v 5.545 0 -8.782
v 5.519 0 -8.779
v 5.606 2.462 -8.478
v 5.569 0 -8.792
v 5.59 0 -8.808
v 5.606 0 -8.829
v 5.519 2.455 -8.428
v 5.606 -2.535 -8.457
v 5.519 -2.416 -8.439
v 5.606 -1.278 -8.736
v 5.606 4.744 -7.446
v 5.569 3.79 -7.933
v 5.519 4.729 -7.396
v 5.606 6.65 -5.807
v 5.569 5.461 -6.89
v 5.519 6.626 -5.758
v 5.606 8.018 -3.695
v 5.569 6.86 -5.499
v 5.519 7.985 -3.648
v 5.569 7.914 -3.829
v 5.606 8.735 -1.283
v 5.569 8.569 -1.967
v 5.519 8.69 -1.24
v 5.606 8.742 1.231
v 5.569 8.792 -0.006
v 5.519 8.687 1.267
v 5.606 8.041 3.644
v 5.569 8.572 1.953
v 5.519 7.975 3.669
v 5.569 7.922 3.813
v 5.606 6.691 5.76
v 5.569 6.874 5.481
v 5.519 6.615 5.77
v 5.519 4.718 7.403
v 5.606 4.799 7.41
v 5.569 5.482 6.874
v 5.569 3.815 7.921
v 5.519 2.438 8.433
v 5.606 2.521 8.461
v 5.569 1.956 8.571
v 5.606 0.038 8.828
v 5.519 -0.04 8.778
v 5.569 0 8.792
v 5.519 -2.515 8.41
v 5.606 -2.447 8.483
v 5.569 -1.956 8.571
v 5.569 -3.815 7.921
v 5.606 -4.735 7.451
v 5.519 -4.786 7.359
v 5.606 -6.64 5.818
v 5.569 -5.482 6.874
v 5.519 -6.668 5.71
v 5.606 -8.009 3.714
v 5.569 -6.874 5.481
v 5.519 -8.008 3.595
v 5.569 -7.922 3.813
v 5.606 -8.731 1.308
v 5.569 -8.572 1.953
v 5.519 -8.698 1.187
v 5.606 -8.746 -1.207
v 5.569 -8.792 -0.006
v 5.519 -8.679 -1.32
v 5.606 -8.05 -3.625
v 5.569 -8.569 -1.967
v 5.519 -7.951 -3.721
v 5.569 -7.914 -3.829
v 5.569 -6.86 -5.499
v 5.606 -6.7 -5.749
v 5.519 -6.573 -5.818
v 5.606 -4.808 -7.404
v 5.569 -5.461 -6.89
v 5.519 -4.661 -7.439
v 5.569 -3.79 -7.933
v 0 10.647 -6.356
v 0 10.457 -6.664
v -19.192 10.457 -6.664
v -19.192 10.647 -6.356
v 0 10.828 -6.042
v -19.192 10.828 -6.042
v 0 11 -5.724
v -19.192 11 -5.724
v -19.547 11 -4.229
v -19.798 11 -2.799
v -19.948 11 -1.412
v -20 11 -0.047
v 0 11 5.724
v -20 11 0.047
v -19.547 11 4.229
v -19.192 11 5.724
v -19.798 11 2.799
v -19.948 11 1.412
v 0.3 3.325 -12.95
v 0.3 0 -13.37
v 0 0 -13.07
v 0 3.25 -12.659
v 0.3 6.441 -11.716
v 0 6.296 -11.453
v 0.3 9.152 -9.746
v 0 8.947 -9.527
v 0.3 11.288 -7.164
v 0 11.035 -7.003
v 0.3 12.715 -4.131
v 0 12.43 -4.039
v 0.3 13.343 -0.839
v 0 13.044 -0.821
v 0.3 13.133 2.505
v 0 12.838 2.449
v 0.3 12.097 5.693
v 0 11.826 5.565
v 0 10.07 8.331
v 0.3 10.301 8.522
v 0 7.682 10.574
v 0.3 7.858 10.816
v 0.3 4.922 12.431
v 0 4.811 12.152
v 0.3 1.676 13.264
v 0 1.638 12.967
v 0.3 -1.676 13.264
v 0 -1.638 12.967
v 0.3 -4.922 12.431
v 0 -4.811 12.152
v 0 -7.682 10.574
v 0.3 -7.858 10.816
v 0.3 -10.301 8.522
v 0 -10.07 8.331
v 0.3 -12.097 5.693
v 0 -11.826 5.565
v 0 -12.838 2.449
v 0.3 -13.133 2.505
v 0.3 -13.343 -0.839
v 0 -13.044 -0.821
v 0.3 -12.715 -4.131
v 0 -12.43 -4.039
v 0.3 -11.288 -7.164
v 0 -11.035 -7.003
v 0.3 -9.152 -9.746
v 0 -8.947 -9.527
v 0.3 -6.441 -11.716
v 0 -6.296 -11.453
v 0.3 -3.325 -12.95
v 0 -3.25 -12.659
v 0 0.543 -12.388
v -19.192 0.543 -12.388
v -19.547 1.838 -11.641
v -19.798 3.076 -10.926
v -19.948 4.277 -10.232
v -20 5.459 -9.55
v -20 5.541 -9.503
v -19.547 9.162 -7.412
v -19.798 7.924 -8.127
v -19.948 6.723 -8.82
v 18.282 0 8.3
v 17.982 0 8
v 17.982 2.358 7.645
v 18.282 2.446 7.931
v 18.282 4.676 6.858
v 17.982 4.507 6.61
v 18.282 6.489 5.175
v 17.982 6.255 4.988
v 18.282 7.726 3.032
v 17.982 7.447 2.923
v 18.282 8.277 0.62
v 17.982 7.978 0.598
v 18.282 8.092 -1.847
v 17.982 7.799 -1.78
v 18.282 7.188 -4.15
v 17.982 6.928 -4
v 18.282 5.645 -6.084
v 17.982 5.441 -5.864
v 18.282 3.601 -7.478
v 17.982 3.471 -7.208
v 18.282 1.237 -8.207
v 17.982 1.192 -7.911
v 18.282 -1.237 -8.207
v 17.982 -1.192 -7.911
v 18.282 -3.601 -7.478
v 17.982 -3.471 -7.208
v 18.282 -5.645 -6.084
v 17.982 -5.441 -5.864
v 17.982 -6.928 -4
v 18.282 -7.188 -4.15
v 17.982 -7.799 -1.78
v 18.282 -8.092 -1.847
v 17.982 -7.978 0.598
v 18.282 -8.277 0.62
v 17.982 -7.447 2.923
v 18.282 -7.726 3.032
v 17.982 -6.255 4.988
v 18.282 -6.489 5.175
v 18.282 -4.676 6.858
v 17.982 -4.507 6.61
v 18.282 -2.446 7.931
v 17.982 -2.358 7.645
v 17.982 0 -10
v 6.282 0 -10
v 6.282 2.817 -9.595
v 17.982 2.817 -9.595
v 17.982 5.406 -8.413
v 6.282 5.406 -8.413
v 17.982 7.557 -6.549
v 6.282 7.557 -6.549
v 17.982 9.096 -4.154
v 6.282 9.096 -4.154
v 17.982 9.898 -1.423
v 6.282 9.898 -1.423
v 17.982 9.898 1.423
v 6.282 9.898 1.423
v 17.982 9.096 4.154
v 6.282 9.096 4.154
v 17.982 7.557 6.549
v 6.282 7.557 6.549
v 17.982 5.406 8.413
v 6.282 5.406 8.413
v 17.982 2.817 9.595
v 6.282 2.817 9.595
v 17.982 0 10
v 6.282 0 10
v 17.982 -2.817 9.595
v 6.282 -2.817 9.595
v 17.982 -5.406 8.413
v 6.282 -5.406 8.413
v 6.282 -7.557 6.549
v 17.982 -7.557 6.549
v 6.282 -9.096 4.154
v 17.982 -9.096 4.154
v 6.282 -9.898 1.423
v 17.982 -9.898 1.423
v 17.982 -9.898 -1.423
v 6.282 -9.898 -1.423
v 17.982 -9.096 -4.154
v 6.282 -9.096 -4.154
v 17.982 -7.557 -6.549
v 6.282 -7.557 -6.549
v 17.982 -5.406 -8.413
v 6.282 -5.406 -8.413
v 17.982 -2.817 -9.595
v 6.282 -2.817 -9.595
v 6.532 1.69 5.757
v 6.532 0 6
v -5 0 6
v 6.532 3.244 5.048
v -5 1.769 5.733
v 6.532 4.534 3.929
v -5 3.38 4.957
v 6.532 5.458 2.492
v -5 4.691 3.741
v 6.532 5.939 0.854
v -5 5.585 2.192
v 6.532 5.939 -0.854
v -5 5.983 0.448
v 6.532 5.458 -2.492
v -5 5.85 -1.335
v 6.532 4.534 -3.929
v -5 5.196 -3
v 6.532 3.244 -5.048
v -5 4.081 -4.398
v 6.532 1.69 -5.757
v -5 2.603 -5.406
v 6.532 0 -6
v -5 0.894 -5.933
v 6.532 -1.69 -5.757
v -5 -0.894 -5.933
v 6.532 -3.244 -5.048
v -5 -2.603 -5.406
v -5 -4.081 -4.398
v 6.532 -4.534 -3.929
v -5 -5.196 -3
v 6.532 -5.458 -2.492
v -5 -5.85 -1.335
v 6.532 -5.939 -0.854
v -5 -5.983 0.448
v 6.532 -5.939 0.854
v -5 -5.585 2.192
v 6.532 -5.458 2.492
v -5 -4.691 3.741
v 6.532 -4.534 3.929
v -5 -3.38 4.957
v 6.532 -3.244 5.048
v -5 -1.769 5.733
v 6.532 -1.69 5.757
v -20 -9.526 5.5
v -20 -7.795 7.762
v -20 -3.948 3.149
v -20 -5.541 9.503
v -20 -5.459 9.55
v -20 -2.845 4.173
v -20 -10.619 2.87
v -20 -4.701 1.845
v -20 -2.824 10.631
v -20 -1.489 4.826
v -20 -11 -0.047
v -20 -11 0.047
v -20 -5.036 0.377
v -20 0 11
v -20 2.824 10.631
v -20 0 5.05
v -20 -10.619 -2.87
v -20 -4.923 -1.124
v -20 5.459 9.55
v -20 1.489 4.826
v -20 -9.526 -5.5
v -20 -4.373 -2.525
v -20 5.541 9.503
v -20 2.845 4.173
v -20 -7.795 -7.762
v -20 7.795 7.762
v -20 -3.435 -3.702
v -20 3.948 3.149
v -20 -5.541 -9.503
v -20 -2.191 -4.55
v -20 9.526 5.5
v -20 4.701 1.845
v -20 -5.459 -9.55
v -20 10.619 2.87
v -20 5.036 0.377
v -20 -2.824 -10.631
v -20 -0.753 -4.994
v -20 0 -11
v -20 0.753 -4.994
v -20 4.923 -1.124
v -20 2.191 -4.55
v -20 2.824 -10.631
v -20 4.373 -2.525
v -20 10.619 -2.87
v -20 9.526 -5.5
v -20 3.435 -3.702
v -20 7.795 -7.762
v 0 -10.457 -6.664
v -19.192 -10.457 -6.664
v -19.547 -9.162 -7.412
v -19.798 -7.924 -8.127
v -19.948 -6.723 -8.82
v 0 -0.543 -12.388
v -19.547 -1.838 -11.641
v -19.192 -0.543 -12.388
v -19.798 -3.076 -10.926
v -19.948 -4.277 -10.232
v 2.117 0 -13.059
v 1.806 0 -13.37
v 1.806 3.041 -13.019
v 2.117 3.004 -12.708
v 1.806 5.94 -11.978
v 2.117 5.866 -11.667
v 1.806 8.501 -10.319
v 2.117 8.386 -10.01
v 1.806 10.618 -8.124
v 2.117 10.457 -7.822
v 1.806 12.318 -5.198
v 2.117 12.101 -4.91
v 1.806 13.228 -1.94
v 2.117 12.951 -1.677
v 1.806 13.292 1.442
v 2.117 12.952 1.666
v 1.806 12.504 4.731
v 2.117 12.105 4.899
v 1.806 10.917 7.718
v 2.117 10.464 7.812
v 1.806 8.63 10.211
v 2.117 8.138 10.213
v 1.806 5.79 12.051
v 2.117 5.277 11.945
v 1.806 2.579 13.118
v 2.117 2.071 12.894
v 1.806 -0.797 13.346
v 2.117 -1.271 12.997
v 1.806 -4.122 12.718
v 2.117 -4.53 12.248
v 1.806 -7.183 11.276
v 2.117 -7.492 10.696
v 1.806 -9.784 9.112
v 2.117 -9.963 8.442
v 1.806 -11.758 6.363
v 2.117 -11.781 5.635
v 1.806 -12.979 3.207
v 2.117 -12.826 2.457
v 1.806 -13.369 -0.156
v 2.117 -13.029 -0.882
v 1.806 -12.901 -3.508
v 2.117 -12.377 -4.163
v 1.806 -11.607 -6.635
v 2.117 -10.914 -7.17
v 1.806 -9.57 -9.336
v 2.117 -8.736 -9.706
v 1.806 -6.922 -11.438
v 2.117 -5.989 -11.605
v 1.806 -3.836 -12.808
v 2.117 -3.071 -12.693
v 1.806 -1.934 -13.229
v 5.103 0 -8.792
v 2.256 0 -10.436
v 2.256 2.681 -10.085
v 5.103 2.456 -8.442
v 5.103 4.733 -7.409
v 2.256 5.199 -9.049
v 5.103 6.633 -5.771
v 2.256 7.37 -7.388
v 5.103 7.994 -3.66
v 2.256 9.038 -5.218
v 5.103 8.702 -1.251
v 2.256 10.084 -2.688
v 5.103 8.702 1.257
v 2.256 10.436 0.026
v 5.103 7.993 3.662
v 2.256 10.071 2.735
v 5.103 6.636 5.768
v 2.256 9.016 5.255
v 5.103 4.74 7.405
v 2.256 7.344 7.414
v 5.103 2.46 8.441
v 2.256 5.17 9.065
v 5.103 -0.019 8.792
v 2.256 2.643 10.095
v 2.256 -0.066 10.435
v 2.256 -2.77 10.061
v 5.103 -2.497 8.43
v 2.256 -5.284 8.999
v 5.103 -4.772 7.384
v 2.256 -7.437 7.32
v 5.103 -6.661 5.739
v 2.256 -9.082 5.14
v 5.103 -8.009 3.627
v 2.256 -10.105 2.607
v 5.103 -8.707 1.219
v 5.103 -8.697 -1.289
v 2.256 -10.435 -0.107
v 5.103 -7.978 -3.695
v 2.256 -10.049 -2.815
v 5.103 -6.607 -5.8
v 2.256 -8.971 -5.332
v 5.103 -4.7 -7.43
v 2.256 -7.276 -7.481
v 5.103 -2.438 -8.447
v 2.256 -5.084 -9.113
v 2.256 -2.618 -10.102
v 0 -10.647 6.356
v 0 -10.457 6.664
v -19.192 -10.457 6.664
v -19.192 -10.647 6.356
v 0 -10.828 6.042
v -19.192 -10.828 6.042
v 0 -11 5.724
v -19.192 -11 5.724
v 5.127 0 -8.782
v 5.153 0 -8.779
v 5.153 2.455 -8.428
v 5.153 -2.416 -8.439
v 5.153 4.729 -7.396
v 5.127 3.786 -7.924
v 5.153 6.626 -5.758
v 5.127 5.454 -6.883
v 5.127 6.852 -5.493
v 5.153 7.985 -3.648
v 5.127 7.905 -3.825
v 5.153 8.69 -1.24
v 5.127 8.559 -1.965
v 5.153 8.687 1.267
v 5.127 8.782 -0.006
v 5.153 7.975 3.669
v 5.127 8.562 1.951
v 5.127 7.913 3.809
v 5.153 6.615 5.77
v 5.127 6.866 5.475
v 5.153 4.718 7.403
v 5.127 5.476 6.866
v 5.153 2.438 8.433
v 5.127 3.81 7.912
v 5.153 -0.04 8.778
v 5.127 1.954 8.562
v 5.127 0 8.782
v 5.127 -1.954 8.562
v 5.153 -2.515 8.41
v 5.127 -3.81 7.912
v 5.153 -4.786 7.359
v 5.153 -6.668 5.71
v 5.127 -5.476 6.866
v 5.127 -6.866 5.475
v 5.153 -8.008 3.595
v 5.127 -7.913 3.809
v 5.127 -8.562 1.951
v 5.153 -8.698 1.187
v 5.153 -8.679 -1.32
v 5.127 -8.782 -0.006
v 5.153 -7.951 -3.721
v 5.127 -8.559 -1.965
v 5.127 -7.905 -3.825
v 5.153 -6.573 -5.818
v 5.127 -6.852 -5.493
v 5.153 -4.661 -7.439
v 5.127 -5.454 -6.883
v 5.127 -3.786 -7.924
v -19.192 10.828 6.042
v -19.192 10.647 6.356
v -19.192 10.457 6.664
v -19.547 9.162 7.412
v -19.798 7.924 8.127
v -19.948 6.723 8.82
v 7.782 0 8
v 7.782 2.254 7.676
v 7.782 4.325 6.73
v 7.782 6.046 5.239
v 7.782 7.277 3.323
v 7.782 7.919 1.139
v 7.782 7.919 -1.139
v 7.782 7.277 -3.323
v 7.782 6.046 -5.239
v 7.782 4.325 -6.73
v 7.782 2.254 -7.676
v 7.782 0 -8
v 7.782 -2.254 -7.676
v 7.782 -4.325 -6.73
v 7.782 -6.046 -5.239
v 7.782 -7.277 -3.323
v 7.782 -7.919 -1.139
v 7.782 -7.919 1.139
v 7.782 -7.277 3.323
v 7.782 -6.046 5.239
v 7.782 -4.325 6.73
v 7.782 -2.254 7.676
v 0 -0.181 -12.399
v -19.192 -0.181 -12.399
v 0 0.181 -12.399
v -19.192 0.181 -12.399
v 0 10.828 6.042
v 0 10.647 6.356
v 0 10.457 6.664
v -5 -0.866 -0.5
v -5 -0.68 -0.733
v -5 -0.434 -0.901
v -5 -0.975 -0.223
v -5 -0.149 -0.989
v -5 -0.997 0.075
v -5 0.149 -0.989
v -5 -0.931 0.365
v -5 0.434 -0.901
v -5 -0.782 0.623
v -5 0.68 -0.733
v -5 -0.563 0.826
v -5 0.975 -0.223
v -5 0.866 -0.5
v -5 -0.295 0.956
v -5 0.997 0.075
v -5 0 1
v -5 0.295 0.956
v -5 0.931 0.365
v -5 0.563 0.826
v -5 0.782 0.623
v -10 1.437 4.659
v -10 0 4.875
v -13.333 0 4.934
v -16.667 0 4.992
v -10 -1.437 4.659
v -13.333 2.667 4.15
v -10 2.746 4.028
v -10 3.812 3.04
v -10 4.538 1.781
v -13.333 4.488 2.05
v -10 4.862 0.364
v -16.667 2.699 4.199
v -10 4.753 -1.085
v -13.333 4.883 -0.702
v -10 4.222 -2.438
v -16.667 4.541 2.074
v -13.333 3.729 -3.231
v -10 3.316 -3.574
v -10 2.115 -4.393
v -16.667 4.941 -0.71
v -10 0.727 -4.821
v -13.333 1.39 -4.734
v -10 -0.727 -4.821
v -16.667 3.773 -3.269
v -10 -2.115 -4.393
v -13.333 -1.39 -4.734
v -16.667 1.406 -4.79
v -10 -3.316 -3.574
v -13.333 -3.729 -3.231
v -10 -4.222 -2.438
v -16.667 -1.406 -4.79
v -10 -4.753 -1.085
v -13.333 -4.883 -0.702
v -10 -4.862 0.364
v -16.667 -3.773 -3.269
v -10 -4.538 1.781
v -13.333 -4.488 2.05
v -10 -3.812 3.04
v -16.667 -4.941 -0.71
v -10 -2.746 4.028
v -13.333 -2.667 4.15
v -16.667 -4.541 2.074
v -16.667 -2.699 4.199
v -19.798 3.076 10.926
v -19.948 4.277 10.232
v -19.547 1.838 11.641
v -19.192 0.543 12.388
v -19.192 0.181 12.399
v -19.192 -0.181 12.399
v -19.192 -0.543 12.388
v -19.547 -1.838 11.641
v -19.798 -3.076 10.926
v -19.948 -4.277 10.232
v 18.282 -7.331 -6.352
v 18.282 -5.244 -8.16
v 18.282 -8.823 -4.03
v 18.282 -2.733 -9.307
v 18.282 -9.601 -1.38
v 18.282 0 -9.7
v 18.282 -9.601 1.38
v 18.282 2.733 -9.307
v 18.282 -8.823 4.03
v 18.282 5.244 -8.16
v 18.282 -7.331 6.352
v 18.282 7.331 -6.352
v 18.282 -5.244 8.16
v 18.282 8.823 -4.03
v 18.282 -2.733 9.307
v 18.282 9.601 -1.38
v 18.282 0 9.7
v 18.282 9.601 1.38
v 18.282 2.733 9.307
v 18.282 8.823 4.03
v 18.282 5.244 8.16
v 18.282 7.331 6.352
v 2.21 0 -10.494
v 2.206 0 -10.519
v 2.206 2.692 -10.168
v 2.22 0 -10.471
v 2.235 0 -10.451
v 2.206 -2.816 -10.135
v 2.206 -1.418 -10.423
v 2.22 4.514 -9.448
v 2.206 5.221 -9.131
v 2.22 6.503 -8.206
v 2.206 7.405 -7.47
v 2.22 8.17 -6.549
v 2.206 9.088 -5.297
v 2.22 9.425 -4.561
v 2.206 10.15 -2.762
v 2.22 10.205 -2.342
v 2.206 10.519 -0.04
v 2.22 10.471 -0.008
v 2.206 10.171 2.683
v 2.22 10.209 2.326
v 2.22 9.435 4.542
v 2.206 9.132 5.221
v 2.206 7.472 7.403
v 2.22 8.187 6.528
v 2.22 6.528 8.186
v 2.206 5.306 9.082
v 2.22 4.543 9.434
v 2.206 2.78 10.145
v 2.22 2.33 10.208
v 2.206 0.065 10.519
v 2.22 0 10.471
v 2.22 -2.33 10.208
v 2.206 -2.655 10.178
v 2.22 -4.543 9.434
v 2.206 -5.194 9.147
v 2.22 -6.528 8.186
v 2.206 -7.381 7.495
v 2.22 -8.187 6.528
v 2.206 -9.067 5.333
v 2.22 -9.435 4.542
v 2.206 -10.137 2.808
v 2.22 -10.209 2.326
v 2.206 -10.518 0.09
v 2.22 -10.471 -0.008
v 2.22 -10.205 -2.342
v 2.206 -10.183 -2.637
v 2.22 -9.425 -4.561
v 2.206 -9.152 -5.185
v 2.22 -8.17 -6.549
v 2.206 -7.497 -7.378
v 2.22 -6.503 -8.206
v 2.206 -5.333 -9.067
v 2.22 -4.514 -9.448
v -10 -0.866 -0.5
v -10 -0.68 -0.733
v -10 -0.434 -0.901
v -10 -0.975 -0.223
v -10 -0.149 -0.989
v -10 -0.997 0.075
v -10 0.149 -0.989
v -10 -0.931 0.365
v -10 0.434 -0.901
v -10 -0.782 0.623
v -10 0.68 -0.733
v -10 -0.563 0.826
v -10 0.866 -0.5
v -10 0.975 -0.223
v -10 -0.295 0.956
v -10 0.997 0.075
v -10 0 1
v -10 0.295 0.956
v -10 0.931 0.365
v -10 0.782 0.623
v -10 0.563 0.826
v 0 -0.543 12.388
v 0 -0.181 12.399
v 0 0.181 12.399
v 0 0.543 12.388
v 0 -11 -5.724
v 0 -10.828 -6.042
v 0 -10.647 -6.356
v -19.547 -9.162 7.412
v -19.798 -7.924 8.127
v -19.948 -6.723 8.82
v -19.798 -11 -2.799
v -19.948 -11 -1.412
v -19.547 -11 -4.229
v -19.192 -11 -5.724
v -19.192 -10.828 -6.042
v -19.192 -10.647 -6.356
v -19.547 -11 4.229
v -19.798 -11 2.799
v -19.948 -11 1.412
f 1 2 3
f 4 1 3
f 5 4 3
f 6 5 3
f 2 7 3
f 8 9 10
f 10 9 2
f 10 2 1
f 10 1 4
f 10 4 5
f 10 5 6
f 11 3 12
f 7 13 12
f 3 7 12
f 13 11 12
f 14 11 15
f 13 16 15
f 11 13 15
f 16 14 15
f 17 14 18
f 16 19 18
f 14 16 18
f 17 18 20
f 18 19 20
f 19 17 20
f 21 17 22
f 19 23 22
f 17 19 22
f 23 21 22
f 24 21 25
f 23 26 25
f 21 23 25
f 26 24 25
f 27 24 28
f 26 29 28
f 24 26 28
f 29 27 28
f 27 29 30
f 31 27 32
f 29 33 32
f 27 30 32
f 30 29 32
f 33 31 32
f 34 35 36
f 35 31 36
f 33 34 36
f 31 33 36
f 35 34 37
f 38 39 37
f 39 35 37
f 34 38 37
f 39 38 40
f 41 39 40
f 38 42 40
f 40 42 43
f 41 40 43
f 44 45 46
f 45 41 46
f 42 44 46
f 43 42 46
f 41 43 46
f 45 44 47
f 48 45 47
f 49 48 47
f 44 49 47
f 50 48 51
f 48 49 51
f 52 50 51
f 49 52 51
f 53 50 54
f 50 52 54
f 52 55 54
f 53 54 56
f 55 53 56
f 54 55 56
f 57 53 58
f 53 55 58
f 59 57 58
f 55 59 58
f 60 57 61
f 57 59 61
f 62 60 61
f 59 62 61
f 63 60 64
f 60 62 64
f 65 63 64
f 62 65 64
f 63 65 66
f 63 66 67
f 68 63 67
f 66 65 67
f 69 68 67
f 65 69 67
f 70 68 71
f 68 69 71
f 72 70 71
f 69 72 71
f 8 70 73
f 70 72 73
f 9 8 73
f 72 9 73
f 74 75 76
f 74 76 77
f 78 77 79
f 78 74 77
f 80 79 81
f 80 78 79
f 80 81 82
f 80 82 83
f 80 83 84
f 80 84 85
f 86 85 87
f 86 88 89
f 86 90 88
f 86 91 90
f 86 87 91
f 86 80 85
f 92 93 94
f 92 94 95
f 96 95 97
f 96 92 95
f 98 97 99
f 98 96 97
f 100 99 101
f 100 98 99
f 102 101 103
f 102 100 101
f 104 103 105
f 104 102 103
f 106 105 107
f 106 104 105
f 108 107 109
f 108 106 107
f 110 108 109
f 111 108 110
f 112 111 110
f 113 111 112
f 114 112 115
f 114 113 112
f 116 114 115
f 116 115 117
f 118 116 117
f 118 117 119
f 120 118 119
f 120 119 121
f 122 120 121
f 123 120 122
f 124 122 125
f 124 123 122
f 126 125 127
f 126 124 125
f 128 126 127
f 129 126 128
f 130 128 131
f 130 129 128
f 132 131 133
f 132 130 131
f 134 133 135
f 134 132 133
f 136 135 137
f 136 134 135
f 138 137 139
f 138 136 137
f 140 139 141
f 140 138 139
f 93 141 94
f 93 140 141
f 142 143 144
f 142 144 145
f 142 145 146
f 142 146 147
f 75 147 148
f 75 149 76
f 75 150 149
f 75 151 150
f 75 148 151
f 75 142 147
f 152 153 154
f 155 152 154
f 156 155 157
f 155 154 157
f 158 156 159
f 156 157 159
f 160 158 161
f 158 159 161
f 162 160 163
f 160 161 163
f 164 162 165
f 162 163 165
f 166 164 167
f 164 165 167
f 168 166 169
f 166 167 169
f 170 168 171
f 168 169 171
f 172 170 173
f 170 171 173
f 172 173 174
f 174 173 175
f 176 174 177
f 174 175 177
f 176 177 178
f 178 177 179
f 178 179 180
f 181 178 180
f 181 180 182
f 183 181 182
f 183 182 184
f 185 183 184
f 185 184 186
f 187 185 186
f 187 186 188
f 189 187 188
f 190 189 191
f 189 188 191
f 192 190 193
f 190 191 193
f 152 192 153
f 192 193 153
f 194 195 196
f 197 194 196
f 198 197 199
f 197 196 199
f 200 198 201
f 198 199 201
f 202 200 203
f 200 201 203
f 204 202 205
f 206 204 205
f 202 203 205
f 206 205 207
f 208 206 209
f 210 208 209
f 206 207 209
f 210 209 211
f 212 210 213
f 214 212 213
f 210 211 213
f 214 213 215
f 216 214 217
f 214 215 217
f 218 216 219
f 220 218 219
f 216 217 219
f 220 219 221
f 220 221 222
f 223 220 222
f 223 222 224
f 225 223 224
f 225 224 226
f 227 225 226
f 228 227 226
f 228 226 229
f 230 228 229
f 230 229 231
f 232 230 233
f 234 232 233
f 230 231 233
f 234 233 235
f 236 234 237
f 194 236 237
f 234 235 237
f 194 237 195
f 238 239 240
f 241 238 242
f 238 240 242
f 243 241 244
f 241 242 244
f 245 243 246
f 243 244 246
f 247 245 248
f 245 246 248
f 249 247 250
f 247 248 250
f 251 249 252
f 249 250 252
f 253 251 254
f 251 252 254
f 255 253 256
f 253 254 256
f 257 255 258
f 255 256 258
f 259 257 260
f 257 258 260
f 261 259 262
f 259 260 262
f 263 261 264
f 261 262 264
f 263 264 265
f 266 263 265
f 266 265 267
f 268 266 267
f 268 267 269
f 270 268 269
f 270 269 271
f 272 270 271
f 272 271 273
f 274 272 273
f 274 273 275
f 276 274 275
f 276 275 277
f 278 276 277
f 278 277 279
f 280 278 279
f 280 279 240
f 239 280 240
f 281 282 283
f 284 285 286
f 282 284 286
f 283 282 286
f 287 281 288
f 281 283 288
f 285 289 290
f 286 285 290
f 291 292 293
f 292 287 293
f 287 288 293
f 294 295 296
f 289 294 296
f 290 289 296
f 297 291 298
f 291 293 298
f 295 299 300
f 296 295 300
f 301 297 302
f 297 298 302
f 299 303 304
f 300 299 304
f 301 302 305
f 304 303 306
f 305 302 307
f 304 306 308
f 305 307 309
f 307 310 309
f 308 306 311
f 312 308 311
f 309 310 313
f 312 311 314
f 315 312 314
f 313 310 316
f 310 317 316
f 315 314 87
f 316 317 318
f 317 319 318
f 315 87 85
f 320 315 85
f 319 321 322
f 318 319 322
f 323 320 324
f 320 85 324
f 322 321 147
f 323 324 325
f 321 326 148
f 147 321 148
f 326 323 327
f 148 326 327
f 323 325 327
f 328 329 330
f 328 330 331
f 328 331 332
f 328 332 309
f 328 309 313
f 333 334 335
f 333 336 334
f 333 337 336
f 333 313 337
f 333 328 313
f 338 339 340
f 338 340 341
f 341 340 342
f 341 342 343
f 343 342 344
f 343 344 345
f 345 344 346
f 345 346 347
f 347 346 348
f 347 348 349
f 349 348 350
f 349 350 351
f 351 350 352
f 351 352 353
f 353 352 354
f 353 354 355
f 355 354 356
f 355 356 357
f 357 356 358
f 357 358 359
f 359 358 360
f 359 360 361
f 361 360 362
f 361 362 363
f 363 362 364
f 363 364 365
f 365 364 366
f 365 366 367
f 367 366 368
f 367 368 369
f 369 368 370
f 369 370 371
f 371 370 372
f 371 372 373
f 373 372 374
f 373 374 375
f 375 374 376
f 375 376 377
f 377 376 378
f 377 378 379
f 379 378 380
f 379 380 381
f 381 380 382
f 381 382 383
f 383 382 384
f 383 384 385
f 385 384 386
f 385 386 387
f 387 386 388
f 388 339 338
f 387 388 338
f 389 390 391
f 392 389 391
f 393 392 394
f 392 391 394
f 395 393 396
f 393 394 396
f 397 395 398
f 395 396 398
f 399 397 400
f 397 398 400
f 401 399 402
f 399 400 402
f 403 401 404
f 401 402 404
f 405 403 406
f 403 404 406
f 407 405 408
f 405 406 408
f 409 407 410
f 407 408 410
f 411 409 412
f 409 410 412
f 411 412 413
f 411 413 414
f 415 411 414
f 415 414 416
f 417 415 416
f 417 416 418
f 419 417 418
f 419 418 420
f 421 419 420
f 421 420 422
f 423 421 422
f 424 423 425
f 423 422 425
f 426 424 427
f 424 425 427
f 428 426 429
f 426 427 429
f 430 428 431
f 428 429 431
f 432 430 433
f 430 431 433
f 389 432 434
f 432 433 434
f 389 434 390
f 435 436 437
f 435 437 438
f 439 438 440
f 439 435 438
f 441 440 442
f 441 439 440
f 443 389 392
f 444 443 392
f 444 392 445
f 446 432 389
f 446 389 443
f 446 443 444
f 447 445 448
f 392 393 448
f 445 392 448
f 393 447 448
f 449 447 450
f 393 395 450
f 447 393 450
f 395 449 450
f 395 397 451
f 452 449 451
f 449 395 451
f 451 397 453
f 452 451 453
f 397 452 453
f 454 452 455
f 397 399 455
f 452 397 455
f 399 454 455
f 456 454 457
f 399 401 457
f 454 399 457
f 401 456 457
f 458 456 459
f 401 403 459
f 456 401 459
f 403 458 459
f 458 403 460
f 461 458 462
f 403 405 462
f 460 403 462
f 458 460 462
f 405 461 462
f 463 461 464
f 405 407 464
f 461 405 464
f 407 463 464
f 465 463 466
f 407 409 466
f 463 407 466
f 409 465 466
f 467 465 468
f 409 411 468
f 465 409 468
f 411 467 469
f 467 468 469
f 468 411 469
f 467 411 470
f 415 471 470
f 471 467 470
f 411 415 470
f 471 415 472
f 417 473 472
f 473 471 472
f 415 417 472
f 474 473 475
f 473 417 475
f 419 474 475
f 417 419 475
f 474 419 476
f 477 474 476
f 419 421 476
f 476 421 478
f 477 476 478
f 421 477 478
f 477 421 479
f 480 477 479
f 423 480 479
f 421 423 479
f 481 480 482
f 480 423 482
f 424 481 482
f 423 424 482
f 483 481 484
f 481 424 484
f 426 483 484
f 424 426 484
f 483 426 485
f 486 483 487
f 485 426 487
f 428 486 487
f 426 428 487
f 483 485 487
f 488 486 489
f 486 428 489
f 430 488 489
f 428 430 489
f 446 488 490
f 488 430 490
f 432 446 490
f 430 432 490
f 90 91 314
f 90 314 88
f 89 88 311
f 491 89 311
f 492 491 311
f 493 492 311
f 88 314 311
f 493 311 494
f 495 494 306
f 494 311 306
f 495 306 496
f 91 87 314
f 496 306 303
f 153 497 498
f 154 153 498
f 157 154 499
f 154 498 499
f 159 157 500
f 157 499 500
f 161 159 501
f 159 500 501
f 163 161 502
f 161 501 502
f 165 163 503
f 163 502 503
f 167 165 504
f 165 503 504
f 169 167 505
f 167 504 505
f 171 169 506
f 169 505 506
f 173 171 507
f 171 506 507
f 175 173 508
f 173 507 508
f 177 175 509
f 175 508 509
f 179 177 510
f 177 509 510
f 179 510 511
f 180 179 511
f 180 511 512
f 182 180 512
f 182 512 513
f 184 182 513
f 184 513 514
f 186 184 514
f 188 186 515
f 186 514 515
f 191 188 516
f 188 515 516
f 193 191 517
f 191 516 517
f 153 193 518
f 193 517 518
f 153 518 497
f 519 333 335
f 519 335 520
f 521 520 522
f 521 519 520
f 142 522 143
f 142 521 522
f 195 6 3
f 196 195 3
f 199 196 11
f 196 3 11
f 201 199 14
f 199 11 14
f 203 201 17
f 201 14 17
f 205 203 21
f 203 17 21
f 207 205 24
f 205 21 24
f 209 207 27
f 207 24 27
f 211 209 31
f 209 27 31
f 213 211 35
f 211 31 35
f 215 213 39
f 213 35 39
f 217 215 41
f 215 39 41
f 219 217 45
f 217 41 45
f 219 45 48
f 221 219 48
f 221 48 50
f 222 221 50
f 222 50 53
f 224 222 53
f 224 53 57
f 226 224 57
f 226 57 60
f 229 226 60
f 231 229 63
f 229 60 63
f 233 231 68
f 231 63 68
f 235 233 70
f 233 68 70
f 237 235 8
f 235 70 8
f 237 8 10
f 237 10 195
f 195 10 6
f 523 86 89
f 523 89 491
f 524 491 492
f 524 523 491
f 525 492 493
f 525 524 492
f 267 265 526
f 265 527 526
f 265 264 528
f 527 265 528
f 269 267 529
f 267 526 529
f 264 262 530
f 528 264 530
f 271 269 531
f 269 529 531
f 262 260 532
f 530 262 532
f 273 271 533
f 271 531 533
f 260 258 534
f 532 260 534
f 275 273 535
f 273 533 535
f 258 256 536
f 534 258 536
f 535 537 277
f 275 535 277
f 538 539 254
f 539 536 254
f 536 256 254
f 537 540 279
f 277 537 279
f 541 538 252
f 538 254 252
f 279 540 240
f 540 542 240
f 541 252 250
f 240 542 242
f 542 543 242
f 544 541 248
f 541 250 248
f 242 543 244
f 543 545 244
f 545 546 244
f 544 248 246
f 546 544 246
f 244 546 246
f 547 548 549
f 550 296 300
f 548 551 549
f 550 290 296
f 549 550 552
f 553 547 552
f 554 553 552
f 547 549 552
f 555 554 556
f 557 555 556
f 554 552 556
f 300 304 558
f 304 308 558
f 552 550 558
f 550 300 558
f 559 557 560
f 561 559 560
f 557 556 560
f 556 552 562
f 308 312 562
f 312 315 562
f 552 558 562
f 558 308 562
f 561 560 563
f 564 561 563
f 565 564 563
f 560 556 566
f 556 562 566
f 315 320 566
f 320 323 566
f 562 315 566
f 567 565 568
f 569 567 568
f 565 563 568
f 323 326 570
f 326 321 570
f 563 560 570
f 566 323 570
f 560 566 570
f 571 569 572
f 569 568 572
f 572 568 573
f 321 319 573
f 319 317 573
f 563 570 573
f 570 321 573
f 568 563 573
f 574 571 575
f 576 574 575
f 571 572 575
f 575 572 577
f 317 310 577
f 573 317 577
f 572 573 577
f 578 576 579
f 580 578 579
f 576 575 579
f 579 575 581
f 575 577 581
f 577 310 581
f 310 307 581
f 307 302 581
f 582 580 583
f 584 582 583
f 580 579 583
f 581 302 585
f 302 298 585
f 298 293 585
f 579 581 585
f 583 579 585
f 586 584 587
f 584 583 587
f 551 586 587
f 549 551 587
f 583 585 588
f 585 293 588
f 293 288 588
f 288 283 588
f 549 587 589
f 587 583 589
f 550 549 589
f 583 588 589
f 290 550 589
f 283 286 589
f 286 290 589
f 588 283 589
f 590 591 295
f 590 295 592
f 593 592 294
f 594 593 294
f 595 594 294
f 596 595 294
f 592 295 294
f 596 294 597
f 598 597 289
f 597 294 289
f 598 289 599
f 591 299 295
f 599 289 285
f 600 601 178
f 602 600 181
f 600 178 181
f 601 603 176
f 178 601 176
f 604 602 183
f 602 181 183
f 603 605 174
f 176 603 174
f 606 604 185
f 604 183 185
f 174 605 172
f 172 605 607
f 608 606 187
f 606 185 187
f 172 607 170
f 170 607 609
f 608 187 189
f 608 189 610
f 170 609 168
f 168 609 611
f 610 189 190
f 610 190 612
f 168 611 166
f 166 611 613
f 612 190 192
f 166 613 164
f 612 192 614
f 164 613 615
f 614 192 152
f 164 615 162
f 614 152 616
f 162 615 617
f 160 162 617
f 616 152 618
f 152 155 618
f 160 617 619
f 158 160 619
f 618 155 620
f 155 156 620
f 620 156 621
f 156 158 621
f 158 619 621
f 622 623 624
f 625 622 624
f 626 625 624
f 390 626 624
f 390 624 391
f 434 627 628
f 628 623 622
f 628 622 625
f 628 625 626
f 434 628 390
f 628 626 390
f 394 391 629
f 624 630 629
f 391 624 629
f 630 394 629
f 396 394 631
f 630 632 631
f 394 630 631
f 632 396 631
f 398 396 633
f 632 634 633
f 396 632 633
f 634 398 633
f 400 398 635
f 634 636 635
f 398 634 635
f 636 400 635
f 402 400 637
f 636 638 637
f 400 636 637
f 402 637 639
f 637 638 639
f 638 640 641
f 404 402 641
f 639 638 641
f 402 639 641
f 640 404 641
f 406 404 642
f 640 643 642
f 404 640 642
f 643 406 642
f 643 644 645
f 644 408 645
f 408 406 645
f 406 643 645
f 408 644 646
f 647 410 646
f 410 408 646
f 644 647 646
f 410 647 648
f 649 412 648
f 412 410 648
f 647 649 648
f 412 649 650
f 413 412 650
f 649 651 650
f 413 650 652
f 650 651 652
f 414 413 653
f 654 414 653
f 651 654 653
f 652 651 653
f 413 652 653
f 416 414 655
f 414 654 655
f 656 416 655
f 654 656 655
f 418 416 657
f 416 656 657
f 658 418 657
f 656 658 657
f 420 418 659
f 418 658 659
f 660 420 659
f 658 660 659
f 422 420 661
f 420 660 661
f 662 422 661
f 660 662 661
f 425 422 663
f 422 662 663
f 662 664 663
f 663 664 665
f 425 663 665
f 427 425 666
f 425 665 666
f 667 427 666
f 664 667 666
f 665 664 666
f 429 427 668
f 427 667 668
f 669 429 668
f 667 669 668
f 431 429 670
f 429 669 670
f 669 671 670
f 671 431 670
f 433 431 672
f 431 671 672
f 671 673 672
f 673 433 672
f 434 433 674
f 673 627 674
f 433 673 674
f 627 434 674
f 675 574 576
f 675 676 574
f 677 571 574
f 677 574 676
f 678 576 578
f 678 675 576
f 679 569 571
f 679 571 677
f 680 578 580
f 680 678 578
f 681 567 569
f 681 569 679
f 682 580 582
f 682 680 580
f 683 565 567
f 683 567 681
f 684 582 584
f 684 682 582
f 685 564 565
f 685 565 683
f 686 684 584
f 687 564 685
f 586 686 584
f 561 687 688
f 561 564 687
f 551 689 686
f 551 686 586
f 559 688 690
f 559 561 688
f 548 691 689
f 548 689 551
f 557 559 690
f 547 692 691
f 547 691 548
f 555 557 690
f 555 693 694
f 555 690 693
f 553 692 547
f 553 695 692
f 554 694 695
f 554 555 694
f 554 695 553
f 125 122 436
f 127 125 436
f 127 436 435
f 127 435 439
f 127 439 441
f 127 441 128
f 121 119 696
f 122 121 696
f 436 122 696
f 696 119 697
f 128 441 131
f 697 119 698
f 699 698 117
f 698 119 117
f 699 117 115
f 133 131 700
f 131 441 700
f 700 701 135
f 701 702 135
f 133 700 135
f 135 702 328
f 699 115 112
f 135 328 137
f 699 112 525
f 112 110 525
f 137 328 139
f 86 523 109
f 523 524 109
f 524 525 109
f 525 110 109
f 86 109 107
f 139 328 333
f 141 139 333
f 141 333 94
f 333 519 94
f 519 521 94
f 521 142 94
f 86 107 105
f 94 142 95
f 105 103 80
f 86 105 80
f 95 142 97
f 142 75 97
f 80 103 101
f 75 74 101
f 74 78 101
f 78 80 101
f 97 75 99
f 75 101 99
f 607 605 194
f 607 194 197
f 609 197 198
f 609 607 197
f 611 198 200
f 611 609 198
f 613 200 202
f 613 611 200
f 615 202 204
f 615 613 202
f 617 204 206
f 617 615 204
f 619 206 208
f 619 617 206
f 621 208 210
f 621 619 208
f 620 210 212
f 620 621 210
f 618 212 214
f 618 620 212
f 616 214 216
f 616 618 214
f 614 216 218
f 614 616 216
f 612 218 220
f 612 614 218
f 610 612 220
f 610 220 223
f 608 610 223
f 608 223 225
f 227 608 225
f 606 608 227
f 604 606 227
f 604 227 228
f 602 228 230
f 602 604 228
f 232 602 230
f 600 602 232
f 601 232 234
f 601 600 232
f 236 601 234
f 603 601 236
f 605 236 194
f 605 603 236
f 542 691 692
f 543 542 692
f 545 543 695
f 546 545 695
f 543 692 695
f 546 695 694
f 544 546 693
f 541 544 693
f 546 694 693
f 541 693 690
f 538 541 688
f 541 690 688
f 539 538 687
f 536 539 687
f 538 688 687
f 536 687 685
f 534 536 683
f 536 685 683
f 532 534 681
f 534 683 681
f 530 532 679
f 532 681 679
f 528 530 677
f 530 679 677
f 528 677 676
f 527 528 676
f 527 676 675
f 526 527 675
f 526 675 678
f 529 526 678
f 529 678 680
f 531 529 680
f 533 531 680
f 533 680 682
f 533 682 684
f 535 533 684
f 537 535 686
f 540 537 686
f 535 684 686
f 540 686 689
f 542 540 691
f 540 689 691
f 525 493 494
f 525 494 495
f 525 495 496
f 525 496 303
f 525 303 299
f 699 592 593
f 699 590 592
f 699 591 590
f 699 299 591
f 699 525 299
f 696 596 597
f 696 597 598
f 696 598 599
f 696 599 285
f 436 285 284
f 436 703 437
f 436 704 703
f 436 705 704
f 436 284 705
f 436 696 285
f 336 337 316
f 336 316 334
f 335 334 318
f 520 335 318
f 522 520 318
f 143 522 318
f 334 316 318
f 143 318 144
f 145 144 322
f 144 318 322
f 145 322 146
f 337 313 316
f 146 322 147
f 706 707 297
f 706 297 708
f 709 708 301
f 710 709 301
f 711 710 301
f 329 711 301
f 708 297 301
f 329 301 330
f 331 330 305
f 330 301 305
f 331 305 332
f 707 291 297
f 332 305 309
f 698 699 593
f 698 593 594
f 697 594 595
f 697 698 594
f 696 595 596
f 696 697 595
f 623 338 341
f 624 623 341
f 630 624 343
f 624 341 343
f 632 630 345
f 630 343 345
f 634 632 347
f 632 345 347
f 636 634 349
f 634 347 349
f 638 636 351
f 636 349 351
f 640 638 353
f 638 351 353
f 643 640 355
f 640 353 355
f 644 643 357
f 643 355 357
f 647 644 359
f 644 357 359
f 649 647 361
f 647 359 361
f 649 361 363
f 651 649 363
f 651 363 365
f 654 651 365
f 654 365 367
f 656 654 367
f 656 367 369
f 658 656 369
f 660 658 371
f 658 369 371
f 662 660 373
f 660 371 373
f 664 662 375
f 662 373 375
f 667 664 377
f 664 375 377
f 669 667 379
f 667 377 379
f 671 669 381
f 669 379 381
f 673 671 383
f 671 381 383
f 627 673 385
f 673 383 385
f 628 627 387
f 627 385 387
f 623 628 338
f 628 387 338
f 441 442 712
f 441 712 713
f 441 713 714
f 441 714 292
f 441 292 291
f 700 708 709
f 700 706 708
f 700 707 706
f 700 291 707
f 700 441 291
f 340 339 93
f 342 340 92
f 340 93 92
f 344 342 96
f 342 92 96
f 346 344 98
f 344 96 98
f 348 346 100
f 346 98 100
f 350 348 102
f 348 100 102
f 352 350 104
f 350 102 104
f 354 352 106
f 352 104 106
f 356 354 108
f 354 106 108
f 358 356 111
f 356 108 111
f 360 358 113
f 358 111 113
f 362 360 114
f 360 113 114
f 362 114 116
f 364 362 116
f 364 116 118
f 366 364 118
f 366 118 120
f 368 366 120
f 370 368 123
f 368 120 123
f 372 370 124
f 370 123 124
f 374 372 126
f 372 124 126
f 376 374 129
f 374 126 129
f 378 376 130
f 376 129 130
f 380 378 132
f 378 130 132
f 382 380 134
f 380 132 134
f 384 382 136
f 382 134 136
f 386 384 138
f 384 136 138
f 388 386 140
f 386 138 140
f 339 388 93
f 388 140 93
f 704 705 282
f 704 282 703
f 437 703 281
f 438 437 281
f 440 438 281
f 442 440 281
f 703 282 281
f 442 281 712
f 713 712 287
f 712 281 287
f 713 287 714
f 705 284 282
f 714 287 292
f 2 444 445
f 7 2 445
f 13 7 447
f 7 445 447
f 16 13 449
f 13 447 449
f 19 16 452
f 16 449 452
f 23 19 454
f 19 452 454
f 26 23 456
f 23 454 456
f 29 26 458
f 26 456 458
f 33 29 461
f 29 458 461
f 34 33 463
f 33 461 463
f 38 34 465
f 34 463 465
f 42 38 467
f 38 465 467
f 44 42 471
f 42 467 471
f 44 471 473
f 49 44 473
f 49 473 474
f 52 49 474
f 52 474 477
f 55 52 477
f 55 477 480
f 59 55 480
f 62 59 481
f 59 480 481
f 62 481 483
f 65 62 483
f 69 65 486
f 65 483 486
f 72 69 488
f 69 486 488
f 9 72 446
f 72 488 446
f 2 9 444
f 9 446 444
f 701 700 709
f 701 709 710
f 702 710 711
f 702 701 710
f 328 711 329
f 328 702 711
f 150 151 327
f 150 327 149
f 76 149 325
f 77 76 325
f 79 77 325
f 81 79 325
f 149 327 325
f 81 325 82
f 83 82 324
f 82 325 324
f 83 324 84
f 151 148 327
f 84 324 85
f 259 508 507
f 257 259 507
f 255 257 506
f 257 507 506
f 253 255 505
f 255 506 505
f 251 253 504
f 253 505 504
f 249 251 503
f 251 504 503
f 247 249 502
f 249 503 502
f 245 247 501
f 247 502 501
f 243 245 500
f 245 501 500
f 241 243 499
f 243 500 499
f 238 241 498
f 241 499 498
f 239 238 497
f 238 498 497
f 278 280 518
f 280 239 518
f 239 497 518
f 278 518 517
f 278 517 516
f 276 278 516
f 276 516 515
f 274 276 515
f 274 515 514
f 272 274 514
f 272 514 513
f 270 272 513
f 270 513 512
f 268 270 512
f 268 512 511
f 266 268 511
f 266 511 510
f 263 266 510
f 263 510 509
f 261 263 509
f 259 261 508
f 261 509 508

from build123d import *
from OCP.BRepFilletAPI import BRepFilletAPI_MakeChamfer

# Parameters (mm, degrees)
ESTRUSIONE_ESTRUSIONE1_DEPTH = 20
FORO_16_0_16_1_D             = 16
FORO_16_0_16_1_DEPTH         = 10.5
FORO_16_0_16_1_TIP           = 4.99999996
SMUSSO1_SIZE                 = 0.3
SMUSSO2_SIZE                 = 0.808290377
SMUSSO2_SIZE_2               = 1.4
RACCORDO1_R                  = 0.1
SMUSSO3_SIZE                 = 0.3
SMUSSO3_SIZE2                = 0.311044787
SCHIZZO5_R                   = 5.05
TAGLIO_ESTRUSIONE1_DEPTH     = 10
TAGLIO_ESTRUSIONE1_DRAFT     = -1
SCHIZZO6_R                   = 1
TAGLIO_ESTRUSIONE2_DEPTH     = 5
TAGLIO_ESTRUSIONE3_REACH     = 31.993
SCHIZZO7_R                   = 6


with BuildPart() as part:
    # Schizzo1 → Rivoluzione1 (revolve)
    with BuildSketch(Plane.XY, mode=Mode.PRIVATE) as rivoluzione1_sk:
        Polygon((0, 13.369648388), (0, 0), (18.282401556, 0), (18.282401556, 10), (6.282401556, 10), (5.577169622, 8.778502459), (5.12572234, 8.778502459), (2.207521234, 10.463326653), (2.106030242, 13.369648388), align=None)
    revolve(rivoluzione1_sk.sketch.rotate(Axis((0, 0, 0), (1, 0, 0)), 270), axis=Axis((0, 0, 0), (1, 0, 0)))

    # Schizzo2 → Estrusione-Estrusione1 (add)
    with BuildSketch(Plane.ZY):
        with BuildLine():
            Line((5.723635209, -11), (-5.723635209, -11))
            ThreePointArc((-5.723635209, -11), (-6.2, -10.738715007), (-6.664461837, -10.456813493))
            Line((-6.664461837, -10.456813493), (-12.388097046, -0.543186507))
            ThreePointArc((-12.388097046, -0.543186507), (-12.4, 0), (-12.388097046, 0.543186507))
            Line((-12.388097046, 0.543186507), (-6.664461837, 10.456813493))
            ThreePointArc((-6.664461837, 10.456813493), (-6.2, 10.738715007), (-5.723635209, 11))
            Line((-5.723635209, 11), (5.723635209, 11))
            ThreePointArc((5.723635209, 11), (6.2, 10.738715007), (6.664461837, 10.456813493))
            Line((6.664461837, 10.456813493), (12.388097046, 0.543186507))
            ThreePointArc((12.388097046, 0.543186507), (12.4, 0), (12.388097046, -0.543186507))
            Line((12.388097046, -0.543186507), (6.664461837, -10.456813493))
            ThreePointArc((6.664461837, -10.456813493), (6.2, -10.738715007), (5.723635209, -11))
        make_face()
    extrude(amount=ESTRUSIONE_ESTRUSIONE1_DEPTH)

    # Foro Ø16.0 (16)-1
    with Locations(Plane(origin=(18.282401556, 0, 0), x_dir=(0, 0, -1), z_dir=(1, 0, 0))):
        with Locations((0, 0)):
            Hole(FORO_16_0_16_1_D / 2, depth=FORO_16_0_16_1_DEPTH)
            with Locations((0, 0, -(FORO_16_0_16_1_DEPTH + FORO_16_0_16_1_TIP / 2))):  # 115.989234° drill point
                Cone(0, FORO_16_0_16_1_D / 2, FORO_16_0_16_1_TIP, mode=Mode.SUBTRACT)

    # Smusso1
    smusso1_edges = [part.edges().sort_by_distance(p)[0] for p in [
        (0, 0, 13.369648388),
        (18.282401556, 0, -8),
        (18.282401556, 0, 10),
    ]]
    chamfer(smusso1_edges, length=SMUSSO1_SIZE)

    # Smusso2
    smusso2_edges_1 = [part.edges().sort_by_distance(p)[0] for p in [
        (-20, -10.738715007, -6.2),
    ]]
    smusso2_side_1 = [part.faces().sort_by_distance(p)[0] for p in [
        (-19.983834192, -10.738715007, -6.2),
    ]]
    smusso2_edges_2 = [part.edges().sort_by_distance(p)[0] for p in [
        (-20, 0, -12.4),
    ]]
    smusso2_side_2 = [part.faces().sort_by_distance(p)[0] for p in [
        (-19.983834192, 0, -12.4),
    ]]
    smusso2_edges_3 = [part.edges().sort_by_distance(p)[0] for p in [
        (-20, -10.738715007, 6.2),
    ]]
    smusso2_side_3 = [part.faces().sort_by_distance(p)[0] for p in [
        (-19.983834192, -10.738715007, 6.2),
    ]]
    smusso2_edges_4 = [part.edges().sort_by_distance(p)[0] for p in [
        (-20, 0, 12.4),
    ]]
    smusso2_side_4 = [part.faces().sort_by_distance(p)[0] for p in [
        (-19.983834192, 0, 12.4),
    ]]
    smusso2_edges_5 = [part.edges().sort_by_distance(p)[0] for p in [
        (-20, 10.738715007, 6.2),
    ]]
    smusso2_side_5 = [part.faces().sort_by_distance(p)[0] for p in [
        (-19.983834192, 10.738715007, 6.2),
    ]]
    smusso2_edges_6 = [part.edges().sort_by_distance(p)[0] for p in [
        (-20, 10.738715007, -6.2),
    ]]
    smusso2_side_6 = [part.faces().sort_by_distance(p)[0] for p in [
        (-19.983834192, 10.738715007, -6.2),
    ]]
    smusso2 = BRepFilletAPI_MakeChamfer(part.part.solid().wrapped)
    for e in smusso2_edges_1:
        smusso2.Add(SMUSSO2_SIZE - 0.0001, SMUSSO2_SIZE_2 - 0.0001, e.wrapped, smusso2_side_1[0].wrapped)
    for e in smusso2_edges_2:
        smusso2.Add(SMUSSO2_SIZE - 0.0001, SMUSSO2_SIZE_2 - 0.0001, e.wrapped, smusso2_side_2[0].wrapped)
    for e in smusso2_edges_3:
        smusso2.Add(SMUSSO2_SIZE - 0.0001, SMUSSO2_SIZE_2 - 0.0001, e.wrapped, smusso2_side_3[0].wrapped)
    for e in smusso2_edges_4:
        smusso2.Add(SMUSSO2_SIZE - 0.0001, SMUSSO2_SIZE_2 - 0.0001, e.wrapped, smusso2_side_4[0].wrapped)
    for e in smusso2_edges_5:
        smusso2.Add(SMUSSO2_SIZE - 0.0001, SMUSSO2_SIZE_2 - 0.0001, e.wrapped, smusso2_side_5[0].wrapped)
    for e in smusso2_edges_6:
        smusso2.Add(SMUSSO2_SIZE - 0.0001, SMUSSO2_SIZE_2 - 0.0001, e.wrapped, smusso2_side_6[0].wrapped)
    add(Compound.cast(smusso2.Shape()), mode=Mode.REPLACE)  # a hair under: the kernel refuses the full size

    # Raccordo1
    raccordo1_edges = [part.edges().sort_by_distance(p)[0] for p in [
        (2.207521234, 0, 10.463326653),
        (5.12572234, 0, 8.778502459),
        (5.577169622, 0, 8.778502459),
    ]]
    fillet(raccordo1_edges, radius=RACCORDO1_R)

    # Smusso3
    smusso3_edges = [part.edges().sort_by_distance(p)[0] for p in [
        (2.106030242, 0, 13.369648388),
    ]]
    smusso3_side = [part.faces().sort_by_distance(p)[0] for p in [
        (1.203015121, 0, 13.369648388),
    ]]
    chamfer(smusso3_edges, length=SMUSSO3_SIZE, length2=SMUSSO3_SIZE2, reference=smusso3_side[0])


with BuildPart() as taglio_estrusione1_tool:
    # Schizzo5 → Taglio-Estrusione1 (with draft: the straight prism first)
    with BuildSketch(Plane.ZY.offset(20)):
        Circle(SCHIZZO5_R)
    extrude(amount=-TAGLIO_ESTRUSIONE1_DEPTH)
    # Taglio-Estrusione1: the draft: its side faces are tilted about the plane it starts from
    taglio_estrusione1_sides = [taglio_estrusione1_tool.faces().sort_by_distance(p)[0] for p in [
        (-15, 0, -5.05),
    ]]
    draft(taglio_estrusione1_sides, Plane.ZY.offset(20), TAGLIO_ESTRUSIONE1_DRAFT)


with BuildPart() as part_1:
    add(part.part)

    # Taglio-Estrusione1: cut by taglio_estrusione1_tool
    add(taglio_estrusione1_tool.part, mode=Mode.SUBTRACT)

    # Schizzo6 → Taglio-Estrusione2 (cut)
    with BuildSketch(Plane.ZY.offset(10)):
        Circle(SCHIZZO6_R)
    extrude(amount=-TAGLIO_ESTRUSIONE2_DEPTH, mode=Mode.SUBTRACT)

    # Taglio-Estrusione3: up to this cone (the profile starts outside it)
    taglio_estrusione3_end = Plane(origin=(-5, 0, 0), z_dir=(1, 0, 0)).offset(7.782402556) * Cone(1.6e-06, 39.536957511, 24.710597444, align=(Align.CENTER, Align.CENTER, Align.MIN), mode=Mode.PRIVATE)
    # Schizzo7 → Taglio-Estrusione3 (cut, up to the surface)
    with BuildSketch(Plane.ZY.offset(5), mode=Mode.PRIVATE) as taglio_estrusione3_sk1:
        Circle(SCHIZZO7_R)
    taglio_estrusione3_tool1 = extrude(taglio_estrusione3_sk1.sketch, amount=-TAGLIO_ESTRUSIONE3_REACH, mode=Mode.PRIVATE) - taglio_estrusione3_end
    add(taglio_estrusione3_tool1.solids().sort_by_distance((-5, 0, 0))[0], mode=Mode.SUBTRACT)


solid = part_1.part
